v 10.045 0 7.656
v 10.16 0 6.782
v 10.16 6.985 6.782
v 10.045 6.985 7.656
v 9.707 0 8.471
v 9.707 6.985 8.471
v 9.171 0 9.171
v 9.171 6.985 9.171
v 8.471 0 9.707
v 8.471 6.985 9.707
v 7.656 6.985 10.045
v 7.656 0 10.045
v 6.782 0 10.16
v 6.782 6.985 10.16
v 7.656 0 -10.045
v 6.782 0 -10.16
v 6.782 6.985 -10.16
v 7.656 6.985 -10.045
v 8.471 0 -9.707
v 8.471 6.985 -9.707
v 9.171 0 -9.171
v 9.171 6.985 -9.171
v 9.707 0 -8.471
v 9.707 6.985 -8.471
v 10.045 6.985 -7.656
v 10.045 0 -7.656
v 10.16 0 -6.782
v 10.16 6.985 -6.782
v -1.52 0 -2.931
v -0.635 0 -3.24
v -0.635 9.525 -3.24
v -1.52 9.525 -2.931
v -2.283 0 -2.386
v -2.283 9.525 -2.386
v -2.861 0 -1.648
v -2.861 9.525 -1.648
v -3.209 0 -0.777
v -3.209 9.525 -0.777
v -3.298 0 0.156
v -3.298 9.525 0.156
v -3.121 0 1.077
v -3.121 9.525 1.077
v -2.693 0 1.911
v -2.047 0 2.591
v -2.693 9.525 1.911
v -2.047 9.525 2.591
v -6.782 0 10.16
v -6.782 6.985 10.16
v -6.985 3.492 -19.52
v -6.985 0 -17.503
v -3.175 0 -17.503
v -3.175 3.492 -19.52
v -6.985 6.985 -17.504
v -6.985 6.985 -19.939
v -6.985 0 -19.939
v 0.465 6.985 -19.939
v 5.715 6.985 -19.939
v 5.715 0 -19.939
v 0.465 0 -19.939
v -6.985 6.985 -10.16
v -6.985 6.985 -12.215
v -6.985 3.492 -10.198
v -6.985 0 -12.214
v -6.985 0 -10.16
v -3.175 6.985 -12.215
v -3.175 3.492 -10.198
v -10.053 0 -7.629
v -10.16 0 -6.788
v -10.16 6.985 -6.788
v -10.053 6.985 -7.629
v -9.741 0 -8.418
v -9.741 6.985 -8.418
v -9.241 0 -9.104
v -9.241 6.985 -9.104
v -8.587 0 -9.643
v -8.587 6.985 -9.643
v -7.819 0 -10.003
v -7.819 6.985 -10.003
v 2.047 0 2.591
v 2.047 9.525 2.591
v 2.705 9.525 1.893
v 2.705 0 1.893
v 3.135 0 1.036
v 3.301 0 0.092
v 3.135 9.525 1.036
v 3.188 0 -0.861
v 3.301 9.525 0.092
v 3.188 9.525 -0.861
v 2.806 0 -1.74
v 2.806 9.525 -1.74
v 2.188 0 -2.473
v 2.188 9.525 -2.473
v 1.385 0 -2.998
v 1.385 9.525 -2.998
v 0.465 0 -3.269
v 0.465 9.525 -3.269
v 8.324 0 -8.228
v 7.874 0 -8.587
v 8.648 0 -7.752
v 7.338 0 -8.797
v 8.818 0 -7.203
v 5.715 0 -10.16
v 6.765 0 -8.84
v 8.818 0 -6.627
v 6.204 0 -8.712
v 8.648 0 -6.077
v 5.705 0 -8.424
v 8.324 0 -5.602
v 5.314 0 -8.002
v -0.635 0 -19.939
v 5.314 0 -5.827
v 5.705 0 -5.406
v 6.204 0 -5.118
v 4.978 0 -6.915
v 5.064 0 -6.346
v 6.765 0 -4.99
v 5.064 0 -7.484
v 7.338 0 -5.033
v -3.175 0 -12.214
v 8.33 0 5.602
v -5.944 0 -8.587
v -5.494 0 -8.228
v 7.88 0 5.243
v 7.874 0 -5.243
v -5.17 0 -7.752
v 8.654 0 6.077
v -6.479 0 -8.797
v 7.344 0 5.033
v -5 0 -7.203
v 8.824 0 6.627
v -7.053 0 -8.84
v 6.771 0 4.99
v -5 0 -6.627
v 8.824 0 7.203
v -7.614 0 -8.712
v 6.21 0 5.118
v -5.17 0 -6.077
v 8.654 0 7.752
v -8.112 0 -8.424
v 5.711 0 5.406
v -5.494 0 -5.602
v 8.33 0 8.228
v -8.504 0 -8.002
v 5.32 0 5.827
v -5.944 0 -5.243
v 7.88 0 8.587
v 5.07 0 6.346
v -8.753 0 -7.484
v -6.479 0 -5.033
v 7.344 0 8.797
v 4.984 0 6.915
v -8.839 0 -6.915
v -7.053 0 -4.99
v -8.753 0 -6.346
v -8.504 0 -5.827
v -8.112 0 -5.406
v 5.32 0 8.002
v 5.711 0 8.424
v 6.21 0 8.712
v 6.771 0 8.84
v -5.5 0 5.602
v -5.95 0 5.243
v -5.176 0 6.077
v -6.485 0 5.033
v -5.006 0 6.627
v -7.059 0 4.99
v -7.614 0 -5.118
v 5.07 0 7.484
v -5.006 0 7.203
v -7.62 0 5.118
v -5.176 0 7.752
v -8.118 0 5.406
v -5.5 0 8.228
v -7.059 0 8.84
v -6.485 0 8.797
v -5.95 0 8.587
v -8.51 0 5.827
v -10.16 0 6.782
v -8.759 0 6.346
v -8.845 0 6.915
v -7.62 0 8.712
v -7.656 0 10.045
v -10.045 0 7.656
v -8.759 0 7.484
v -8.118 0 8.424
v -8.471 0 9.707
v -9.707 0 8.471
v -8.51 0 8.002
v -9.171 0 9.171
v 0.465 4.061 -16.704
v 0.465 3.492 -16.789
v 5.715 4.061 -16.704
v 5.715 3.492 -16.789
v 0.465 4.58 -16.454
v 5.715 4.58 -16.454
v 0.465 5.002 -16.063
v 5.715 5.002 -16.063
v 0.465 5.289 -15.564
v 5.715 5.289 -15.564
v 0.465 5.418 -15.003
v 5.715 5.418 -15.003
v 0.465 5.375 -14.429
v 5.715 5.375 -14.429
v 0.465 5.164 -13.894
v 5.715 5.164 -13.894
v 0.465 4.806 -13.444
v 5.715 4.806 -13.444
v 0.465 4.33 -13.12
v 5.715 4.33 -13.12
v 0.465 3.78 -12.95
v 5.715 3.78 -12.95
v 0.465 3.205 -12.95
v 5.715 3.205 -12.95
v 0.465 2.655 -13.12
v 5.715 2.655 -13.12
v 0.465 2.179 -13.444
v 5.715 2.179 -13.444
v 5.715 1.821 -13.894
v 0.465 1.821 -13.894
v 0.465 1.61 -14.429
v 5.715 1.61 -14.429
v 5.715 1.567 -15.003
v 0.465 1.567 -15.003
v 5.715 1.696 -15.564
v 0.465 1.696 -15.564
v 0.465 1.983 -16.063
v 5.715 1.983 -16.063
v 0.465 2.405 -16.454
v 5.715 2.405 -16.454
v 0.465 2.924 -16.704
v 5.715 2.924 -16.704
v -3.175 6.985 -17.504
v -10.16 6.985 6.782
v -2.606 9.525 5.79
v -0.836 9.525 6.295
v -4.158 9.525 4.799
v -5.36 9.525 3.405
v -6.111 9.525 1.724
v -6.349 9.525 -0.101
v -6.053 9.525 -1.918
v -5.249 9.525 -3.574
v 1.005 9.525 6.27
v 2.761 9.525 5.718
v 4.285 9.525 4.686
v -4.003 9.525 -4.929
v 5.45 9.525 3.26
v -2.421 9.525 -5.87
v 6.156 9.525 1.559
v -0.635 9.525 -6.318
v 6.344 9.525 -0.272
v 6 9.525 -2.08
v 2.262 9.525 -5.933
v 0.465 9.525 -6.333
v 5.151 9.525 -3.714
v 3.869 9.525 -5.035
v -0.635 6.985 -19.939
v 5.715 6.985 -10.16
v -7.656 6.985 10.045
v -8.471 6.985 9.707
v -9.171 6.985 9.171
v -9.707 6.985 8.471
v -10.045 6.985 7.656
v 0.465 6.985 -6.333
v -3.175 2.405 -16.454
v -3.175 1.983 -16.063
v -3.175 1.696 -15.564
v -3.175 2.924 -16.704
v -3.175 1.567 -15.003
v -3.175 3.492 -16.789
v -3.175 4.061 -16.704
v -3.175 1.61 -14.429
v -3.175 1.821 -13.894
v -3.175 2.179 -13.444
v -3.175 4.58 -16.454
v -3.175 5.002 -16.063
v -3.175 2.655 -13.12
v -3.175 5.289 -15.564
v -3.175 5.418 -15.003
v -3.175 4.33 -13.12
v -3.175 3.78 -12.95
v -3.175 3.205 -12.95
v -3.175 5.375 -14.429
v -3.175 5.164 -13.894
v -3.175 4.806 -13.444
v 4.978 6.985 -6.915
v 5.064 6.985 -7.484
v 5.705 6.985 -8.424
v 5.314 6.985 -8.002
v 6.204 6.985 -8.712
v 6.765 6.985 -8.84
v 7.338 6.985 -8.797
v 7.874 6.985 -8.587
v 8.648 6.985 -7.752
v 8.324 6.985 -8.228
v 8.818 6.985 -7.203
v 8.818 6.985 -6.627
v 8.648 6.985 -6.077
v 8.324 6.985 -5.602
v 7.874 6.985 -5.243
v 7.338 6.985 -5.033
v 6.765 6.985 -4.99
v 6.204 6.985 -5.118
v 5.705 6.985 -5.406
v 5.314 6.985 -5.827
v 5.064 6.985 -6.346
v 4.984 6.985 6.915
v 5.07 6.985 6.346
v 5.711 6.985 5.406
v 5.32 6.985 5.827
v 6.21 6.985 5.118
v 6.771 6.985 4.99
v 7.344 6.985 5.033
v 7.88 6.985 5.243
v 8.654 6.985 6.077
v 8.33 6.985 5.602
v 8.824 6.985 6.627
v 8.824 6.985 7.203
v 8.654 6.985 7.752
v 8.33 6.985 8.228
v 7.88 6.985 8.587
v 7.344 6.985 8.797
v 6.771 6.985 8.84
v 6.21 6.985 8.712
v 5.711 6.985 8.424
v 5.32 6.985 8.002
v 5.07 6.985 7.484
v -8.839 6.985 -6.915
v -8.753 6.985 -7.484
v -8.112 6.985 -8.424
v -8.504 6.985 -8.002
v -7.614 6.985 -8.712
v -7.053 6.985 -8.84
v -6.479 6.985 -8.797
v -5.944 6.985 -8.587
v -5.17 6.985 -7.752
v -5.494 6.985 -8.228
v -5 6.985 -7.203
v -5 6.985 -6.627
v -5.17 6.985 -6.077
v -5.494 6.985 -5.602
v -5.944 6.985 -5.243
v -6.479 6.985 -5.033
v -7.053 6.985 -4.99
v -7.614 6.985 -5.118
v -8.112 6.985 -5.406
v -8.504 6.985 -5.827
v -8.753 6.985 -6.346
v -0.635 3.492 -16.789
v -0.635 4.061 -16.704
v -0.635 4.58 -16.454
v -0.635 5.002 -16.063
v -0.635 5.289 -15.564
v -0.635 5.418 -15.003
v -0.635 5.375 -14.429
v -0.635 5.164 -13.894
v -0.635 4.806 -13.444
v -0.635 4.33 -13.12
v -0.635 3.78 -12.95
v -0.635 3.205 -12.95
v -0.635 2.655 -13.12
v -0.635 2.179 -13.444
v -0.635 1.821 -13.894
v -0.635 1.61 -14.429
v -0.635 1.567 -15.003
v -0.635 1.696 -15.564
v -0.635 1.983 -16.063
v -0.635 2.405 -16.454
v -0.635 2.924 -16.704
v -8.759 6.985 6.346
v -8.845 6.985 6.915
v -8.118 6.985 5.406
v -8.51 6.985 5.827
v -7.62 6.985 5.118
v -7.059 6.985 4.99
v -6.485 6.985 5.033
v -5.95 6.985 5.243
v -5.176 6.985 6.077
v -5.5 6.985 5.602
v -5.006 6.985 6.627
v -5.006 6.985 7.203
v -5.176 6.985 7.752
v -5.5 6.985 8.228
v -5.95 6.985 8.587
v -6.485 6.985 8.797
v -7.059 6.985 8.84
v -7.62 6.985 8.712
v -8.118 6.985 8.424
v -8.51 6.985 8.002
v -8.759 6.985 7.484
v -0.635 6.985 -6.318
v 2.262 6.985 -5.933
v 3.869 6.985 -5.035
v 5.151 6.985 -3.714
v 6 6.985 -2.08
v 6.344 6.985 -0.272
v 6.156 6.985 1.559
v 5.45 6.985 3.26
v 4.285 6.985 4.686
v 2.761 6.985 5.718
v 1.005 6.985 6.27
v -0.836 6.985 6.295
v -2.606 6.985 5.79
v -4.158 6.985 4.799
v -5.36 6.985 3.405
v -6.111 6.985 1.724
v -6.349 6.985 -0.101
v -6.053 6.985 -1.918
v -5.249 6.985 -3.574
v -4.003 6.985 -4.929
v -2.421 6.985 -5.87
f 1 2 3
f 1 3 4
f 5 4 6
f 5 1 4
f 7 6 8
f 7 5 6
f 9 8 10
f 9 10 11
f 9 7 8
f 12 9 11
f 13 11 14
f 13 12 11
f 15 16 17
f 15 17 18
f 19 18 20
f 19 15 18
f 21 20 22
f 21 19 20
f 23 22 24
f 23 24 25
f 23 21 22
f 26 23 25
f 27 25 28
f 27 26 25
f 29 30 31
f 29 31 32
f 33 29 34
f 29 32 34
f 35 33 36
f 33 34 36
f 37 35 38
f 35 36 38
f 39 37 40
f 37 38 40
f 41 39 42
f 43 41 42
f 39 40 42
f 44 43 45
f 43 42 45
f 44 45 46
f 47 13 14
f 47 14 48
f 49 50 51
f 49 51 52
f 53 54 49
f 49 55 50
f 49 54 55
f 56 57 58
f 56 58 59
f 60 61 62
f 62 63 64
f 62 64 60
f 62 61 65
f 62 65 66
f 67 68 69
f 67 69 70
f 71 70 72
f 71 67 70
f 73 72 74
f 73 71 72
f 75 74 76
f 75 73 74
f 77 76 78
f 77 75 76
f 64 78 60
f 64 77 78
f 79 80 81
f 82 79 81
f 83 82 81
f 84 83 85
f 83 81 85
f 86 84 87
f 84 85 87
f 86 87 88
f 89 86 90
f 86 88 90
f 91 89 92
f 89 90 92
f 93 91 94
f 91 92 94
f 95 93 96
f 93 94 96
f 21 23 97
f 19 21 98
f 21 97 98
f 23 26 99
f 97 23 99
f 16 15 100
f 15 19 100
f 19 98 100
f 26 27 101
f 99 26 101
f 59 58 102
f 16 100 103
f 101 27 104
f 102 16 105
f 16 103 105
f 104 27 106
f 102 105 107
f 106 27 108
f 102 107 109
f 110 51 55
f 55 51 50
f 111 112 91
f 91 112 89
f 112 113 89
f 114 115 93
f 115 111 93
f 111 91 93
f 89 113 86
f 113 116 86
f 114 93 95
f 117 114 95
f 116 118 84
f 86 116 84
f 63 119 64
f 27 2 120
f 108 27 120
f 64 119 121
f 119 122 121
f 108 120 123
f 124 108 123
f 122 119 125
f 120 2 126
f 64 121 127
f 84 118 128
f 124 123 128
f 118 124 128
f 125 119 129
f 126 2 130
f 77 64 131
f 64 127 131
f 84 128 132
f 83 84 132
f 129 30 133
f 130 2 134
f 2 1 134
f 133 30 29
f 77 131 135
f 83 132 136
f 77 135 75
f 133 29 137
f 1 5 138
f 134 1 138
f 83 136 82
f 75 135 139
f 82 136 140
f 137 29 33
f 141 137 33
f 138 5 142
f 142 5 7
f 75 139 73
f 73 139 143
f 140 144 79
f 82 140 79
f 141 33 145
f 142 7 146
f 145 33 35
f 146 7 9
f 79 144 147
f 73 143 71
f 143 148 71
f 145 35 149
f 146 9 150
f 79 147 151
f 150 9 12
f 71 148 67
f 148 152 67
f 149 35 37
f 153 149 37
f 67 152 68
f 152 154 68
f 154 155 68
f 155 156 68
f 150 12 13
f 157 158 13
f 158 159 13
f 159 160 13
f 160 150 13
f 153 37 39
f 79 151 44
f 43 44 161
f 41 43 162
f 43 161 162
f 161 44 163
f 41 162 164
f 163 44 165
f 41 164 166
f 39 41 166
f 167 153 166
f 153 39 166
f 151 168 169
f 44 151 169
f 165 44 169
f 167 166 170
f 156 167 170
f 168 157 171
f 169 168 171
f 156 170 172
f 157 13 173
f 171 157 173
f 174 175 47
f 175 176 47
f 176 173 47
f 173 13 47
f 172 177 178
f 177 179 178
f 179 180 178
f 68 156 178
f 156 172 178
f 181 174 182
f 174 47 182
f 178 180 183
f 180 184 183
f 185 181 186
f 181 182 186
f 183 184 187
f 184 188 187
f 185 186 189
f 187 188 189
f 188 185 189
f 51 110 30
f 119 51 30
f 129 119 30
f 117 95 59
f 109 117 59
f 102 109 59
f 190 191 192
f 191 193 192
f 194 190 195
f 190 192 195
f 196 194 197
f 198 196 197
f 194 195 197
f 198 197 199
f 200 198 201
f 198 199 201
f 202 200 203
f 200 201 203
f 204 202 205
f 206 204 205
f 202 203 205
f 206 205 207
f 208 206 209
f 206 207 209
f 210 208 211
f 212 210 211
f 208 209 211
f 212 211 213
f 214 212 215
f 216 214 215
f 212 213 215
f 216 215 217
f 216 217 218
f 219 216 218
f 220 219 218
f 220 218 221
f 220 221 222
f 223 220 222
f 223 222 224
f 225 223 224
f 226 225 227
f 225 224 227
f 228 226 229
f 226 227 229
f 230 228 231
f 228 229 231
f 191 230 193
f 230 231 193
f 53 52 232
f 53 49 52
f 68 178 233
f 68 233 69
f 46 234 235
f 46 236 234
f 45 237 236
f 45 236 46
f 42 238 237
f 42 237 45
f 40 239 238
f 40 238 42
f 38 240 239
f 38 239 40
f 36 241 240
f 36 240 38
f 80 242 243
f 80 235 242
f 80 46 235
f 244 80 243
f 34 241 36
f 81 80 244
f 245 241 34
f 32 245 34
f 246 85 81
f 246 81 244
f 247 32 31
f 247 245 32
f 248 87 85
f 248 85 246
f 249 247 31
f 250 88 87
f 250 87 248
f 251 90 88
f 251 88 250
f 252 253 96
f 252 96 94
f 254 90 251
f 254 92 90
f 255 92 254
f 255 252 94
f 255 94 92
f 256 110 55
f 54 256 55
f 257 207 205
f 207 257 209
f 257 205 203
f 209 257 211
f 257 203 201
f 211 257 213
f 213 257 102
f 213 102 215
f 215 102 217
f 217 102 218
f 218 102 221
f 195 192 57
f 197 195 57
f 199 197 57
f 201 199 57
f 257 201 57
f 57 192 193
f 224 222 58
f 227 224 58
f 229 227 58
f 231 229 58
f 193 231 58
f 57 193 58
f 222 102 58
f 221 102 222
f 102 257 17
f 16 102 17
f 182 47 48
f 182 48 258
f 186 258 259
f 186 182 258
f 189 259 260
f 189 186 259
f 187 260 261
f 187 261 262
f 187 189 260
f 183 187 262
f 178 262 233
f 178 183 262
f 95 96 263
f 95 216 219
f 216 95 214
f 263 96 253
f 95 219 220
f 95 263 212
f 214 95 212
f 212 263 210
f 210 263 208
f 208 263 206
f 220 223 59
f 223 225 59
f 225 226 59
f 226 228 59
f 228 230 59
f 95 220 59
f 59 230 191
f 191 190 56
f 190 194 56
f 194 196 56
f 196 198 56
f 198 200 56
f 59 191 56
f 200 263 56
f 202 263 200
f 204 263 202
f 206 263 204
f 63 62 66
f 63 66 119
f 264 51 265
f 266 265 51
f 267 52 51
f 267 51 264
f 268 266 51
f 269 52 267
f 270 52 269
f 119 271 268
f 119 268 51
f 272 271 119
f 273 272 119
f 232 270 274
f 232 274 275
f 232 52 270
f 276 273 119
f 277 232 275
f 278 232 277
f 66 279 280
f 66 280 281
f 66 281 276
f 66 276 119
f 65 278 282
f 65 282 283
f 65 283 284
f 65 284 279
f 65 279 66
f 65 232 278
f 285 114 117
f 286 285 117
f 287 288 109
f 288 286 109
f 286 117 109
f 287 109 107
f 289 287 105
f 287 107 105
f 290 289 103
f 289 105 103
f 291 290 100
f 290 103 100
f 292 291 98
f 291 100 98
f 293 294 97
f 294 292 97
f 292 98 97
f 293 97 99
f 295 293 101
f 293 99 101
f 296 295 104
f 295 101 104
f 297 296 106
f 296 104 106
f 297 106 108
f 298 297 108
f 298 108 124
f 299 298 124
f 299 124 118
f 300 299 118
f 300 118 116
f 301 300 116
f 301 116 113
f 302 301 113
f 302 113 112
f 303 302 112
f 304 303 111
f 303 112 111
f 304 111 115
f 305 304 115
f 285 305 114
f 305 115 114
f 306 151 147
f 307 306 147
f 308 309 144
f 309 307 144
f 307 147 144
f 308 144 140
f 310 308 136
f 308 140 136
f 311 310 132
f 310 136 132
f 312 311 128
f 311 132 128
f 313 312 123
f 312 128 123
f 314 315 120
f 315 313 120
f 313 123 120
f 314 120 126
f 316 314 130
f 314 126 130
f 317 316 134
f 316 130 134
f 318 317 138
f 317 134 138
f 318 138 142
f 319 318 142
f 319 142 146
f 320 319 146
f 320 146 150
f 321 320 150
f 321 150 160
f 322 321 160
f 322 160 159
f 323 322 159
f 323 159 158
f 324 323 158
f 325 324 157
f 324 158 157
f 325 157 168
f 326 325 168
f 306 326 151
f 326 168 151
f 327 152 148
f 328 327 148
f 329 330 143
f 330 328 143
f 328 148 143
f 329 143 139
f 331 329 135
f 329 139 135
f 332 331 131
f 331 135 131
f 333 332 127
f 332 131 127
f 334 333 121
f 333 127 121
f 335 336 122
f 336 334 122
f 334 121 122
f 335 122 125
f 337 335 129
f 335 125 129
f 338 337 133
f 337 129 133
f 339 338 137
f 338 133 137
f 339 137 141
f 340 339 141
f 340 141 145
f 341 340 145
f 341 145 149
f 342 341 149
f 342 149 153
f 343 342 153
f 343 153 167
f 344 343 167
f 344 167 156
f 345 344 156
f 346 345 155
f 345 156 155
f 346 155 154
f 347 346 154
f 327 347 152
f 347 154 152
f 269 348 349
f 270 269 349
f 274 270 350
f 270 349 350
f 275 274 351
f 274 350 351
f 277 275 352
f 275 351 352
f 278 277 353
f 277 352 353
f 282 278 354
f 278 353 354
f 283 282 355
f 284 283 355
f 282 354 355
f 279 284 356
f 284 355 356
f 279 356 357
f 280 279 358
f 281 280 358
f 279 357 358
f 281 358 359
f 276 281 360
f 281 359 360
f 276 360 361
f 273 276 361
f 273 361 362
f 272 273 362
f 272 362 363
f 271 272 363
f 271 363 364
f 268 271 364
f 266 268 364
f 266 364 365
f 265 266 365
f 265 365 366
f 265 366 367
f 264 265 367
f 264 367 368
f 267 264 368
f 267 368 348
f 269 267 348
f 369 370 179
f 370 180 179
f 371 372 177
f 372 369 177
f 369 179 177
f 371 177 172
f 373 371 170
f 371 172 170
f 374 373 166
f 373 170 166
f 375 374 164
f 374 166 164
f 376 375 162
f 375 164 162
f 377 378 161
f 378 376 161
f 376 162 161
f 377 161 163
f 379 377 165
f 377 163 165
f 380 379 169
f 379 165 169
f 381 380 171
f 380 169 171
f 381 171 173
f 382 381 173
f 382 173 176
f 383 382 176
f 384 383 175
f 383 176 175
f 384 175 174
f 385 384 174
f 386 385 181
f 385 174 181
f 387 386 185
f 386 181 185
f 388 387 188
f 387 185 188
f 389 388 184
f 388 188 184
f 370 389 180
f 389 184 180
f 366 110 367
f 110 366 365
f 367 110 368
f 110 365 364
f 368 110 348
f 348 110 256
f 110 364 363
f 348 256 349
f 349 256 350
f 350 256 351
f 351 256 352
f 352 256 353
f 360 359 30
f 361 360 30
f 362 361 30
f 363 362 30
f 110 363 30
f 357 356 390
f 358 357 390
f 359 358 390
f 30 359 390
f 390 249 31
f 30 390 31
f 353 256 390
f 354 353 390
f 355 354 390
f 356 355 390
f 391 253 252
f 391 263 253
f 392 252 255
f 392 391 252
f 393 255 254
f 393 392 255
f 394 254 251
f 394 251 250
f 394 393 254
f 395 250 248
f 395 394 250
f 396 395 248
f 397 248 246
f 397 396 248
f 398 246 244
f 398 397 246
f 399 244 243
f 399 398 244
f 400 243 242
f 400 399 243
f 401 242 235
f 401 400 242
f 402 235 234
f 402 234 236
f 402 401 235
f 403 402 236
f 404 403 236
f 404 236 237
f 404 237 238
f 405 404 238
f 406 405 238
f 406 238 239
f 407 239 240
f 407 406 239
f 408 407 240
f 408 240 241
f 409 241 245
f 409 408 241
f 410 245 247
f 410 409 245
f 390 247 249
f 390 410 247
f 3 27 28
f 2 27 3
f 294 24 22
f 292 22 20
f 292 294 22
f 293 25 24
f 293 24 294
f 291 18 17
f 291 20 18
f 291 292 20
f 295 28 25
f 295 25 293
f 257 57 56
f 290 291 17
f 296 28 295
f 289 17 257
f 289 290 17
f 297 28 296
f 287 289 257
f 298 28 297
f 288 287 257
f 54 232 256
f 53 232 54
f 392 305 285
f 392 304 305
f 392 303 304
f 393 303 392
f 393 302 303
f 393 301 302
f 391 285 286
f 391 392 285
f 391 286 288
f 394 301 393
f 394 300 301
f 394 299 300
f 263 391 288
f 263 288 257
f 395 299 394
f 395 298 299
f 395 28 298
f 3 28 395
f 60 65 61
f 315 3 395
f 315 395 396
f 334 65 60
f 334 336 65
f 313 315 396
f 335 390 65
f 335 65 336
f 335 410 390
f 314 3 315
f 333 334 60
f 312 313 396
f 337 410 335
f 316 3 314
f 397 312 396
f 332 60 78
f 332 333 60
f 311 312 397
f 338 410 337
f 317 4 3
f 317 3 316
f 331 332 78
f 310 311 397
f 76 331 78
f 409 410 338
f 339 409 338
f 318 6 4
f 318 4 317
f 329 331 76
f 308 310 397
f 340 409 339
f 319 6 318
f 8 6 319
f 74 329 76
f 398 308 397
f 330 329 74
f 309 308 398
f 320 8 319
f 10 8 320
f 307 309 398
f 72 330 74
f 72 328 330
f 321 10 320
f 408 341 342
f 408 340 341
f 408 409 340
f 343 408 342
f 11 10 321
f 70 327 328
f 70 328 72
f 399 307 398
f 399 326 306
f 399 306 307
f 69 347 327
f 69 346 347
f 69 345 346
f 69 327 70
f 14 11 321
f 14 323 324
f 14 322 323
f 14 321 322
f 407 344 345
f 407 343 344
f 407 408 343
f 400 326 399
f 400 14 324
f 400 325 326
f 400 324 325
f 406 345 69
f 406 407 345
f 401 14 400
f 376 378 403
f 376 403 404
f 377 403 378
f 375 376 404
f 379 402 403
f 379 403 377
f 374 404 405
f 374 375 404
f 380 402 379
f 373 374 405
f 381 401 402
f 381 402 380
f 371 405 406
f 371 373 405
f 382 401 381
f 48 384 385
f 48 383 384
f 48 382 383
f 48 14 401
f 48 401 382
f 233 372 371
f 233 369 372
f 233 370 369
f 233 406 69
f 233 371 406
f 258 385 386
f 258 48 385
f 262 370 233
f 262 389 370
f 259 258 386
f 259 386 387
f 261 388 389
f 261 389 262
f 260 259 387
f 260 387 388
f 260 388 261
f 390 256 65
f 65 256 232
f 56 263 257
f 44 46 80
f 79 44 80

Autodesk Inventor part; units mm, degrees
ref_plane "YZ Plane" through (0, 0, 0) normal (1, 0, 0) x (0, 1, 0)
ref_plane "XZ Plane" through (0, 0, 0) normal (0, 1, 0) x (-1, 0, 0)
ref_plane "XY Plane" through (0, 0, 0) normal (0, 0, 1) x (1, 0, 0)
sketch "Sketch1" plane through (0, 0, 0) normal (0, 1, 0) x (-1, 0, 0)
  line L0 (-10.16, 10.16) -> (10.16, 10.16)
  line L1 (10.16, 10.16) -> (10.16, -10.16)
  line L2 (-10.16, -10.16) -> (-10.16, 10.16)
  circle A0 centre (6.9088, -6.9148) radius 1.9304
  circle A1 centre (6.9148, 6.9148) radius 1.9304
  circle A2 centre (-6.9148, 6.9148) radius 1.9304
  circle A3 centre (-6.9088, -6.9148) radius 1.9304
  line L3 (-5.715, -10.16) -> (-5.715, -19.939)
  line L4 (-5.715, -19.939) -> (6.985, -19.939)
  line L5 (6.985, -19.939) -> (6.985, -10.16)
  line L6 (10.16, -10.16) -> (6.985, -10.16)
  line L7 (-5.715, -10.16) -> (-10.16, -10.16)
  point P0 (0, 0)
  dimension "d0" = 20.32
  dimension "d2" = 10.16
  dimension "d3" = 10.16
  dimension "d4" = 3.8608
  dimension "d5" = 6.9148
  dimension "d6" = 6.9088
  dimension "d7" = 3.8608
  dimension "d8" = 6.9148
  dimension "d9" = 6.9148
  dimension "d10" = 3.8608
  dimension "d11" = 6.9148
  dimension "d12" = 6.9148
  dimension "d13" = 3.8608
  dimension "d14" = 12.7
  dimension "d16" = 6.985
  dimension "d43" = 10.16
  dimension "d44" = 10.16
  dimension "d45" = 6.9148
  dimension "d46" = 9.779
  dimension "d47" = 9.779
extrude "Extrusion1" add sketch "Sketch1" along normal blind 6.985
sketch "Sketch2" plane through (-6.985, 0, -19.939) normal (-1, 0, 0) x (0, 0, 1)
  circle A0 centre (5.08, 3.4925) radius 4.6609 construction
  line L0 (9.779, 0) -> (0, 0) projected
  line L1 (0, 0) -> (0, 6.985) projected
  line L2 (9.7409, 3.4925) -> (7.4105, -0.544)
  line L3 (7.4105, -0.544) -> (2.7496, -0.544)
  line L4 (2.7496, -0.544) -> (0.4191, 3.4925)
  line L5 (0.4191, 3.4925) -> (2.7495, 7.529)
  line L6 (2.7495, 7.529) -> (7.4104, 7.529)
  line L7 (7.4104, 7.529) -> (9.7409, 3.4925)
  point P0 (19.939, 0)
  dimension "d19" = 9.3218
  dimension "d20" = 3.4925
  dimension "d21" = 5.08
extrude "Extrusion2" cut sketch "Sketch2" against normal blind 3.81
sketch "Sketch3" plane through (5.715, 0, -10.16) normal (1, 0, 0) x (0, 0, -1)
  circle A0 centre (4.699, 3.4925) radius 1.9304
  line L0 (9.779, 0) -> (9.779, 6.985) projected
  line L1 (0, 6.985) -> (9.779, 6.985) projected
  point P0 (-10.16, 0)
  dimension "d24" = 3.8608
  dimension "d25" = 5.08
  dimension "d26" = 3.4925
extrude "Extrusion3" cut sketch "Sketch3" against normal through all
sketch "Sketch4" plane through (0, 6.985, 0) normal (0, 1, 0) x (1, 0, 0)
  circle A0 centre (0, 0) radius 6.35
  dimension "d29" = 12.7
extrude "Extrusion4" add sketch "Sketch4" along normal blind 2.54
sketch "Sketch5" plane through (0, 9.525, 0) normal (0, 1, 0) x (1, 0, 0)
  arc A0 (2.0472, -2.5908) -> (-2.0472, -2.5908) centre (0, 0) ccw
  line L0 (-2.0472, -2.5908) -> (2.0472, -2.5908)
  dimension "d32" = 6.604
  dimension "d33" = 2.5908
fillet "Fillet1" radius 3.3782 4 edges at (10.16, 3.4925, 10.16) (10.16, 3.4925, -10.16) (-10.16, 3.4925, 10.16) (-10.16, 3.4925, -10.16)
extrude "Extrusion5" cut sketch "Sketch5" against normal through all
sketch "Sketch6" plane through (0, 9.525, 0) normal (0, 1, 0) x (1, 0, 0)
  line L0 (-6.985, 19.939) -> (5.715, 19.939) projected
  line L1 (0.4649, 0) -> (0.4649, 19.939)
  line L2 (0.4649, 19.939) -> (-0.635, 20.574)
  line L3 (-0.635, 20.574) -> (-0.635, 0)
  line L4 (-0.4947, -21.2174) -> (0.4649, 19.939) construction
  line L5 (0.635, -20.574) -> (-0.635, 20.574) construction
  line L6 (-0.635, 0) -> (0.4649, 0)
  point P0 (0, 0)
  dimension "d37" = 1.27
extrude "Extrusion6" cut sketch "Sketch6" against normal through all
sketch "Sketch7" plane through (0, 0, 0) normal (0, -1, 0) x (1, 0, 0)
  circle A0 centre (-6.9148, 6.9148) radius 1.9304 construction
  circle A1 centre (-6.9148, 6.9148) radius 4.6609 construction
  point P0 (0, 0)
  dimension "d40" = 9.3218
equation "\"d2\" = 0.5 * d0"
equation "\"d3\" = 0.5 * d0"
equation "\"d8\" = d5"
equation "\"d9\" = d5"
equation "\"d11\" = d5"
equation "\"d12\" = d5"
equation "\"d43\" = 0.5 * d0"
equation "\"d44\" = 0.5 * d0"
equation "\"d45\" = d5"
properties part number "clamping hub 1_4 D through holes"
